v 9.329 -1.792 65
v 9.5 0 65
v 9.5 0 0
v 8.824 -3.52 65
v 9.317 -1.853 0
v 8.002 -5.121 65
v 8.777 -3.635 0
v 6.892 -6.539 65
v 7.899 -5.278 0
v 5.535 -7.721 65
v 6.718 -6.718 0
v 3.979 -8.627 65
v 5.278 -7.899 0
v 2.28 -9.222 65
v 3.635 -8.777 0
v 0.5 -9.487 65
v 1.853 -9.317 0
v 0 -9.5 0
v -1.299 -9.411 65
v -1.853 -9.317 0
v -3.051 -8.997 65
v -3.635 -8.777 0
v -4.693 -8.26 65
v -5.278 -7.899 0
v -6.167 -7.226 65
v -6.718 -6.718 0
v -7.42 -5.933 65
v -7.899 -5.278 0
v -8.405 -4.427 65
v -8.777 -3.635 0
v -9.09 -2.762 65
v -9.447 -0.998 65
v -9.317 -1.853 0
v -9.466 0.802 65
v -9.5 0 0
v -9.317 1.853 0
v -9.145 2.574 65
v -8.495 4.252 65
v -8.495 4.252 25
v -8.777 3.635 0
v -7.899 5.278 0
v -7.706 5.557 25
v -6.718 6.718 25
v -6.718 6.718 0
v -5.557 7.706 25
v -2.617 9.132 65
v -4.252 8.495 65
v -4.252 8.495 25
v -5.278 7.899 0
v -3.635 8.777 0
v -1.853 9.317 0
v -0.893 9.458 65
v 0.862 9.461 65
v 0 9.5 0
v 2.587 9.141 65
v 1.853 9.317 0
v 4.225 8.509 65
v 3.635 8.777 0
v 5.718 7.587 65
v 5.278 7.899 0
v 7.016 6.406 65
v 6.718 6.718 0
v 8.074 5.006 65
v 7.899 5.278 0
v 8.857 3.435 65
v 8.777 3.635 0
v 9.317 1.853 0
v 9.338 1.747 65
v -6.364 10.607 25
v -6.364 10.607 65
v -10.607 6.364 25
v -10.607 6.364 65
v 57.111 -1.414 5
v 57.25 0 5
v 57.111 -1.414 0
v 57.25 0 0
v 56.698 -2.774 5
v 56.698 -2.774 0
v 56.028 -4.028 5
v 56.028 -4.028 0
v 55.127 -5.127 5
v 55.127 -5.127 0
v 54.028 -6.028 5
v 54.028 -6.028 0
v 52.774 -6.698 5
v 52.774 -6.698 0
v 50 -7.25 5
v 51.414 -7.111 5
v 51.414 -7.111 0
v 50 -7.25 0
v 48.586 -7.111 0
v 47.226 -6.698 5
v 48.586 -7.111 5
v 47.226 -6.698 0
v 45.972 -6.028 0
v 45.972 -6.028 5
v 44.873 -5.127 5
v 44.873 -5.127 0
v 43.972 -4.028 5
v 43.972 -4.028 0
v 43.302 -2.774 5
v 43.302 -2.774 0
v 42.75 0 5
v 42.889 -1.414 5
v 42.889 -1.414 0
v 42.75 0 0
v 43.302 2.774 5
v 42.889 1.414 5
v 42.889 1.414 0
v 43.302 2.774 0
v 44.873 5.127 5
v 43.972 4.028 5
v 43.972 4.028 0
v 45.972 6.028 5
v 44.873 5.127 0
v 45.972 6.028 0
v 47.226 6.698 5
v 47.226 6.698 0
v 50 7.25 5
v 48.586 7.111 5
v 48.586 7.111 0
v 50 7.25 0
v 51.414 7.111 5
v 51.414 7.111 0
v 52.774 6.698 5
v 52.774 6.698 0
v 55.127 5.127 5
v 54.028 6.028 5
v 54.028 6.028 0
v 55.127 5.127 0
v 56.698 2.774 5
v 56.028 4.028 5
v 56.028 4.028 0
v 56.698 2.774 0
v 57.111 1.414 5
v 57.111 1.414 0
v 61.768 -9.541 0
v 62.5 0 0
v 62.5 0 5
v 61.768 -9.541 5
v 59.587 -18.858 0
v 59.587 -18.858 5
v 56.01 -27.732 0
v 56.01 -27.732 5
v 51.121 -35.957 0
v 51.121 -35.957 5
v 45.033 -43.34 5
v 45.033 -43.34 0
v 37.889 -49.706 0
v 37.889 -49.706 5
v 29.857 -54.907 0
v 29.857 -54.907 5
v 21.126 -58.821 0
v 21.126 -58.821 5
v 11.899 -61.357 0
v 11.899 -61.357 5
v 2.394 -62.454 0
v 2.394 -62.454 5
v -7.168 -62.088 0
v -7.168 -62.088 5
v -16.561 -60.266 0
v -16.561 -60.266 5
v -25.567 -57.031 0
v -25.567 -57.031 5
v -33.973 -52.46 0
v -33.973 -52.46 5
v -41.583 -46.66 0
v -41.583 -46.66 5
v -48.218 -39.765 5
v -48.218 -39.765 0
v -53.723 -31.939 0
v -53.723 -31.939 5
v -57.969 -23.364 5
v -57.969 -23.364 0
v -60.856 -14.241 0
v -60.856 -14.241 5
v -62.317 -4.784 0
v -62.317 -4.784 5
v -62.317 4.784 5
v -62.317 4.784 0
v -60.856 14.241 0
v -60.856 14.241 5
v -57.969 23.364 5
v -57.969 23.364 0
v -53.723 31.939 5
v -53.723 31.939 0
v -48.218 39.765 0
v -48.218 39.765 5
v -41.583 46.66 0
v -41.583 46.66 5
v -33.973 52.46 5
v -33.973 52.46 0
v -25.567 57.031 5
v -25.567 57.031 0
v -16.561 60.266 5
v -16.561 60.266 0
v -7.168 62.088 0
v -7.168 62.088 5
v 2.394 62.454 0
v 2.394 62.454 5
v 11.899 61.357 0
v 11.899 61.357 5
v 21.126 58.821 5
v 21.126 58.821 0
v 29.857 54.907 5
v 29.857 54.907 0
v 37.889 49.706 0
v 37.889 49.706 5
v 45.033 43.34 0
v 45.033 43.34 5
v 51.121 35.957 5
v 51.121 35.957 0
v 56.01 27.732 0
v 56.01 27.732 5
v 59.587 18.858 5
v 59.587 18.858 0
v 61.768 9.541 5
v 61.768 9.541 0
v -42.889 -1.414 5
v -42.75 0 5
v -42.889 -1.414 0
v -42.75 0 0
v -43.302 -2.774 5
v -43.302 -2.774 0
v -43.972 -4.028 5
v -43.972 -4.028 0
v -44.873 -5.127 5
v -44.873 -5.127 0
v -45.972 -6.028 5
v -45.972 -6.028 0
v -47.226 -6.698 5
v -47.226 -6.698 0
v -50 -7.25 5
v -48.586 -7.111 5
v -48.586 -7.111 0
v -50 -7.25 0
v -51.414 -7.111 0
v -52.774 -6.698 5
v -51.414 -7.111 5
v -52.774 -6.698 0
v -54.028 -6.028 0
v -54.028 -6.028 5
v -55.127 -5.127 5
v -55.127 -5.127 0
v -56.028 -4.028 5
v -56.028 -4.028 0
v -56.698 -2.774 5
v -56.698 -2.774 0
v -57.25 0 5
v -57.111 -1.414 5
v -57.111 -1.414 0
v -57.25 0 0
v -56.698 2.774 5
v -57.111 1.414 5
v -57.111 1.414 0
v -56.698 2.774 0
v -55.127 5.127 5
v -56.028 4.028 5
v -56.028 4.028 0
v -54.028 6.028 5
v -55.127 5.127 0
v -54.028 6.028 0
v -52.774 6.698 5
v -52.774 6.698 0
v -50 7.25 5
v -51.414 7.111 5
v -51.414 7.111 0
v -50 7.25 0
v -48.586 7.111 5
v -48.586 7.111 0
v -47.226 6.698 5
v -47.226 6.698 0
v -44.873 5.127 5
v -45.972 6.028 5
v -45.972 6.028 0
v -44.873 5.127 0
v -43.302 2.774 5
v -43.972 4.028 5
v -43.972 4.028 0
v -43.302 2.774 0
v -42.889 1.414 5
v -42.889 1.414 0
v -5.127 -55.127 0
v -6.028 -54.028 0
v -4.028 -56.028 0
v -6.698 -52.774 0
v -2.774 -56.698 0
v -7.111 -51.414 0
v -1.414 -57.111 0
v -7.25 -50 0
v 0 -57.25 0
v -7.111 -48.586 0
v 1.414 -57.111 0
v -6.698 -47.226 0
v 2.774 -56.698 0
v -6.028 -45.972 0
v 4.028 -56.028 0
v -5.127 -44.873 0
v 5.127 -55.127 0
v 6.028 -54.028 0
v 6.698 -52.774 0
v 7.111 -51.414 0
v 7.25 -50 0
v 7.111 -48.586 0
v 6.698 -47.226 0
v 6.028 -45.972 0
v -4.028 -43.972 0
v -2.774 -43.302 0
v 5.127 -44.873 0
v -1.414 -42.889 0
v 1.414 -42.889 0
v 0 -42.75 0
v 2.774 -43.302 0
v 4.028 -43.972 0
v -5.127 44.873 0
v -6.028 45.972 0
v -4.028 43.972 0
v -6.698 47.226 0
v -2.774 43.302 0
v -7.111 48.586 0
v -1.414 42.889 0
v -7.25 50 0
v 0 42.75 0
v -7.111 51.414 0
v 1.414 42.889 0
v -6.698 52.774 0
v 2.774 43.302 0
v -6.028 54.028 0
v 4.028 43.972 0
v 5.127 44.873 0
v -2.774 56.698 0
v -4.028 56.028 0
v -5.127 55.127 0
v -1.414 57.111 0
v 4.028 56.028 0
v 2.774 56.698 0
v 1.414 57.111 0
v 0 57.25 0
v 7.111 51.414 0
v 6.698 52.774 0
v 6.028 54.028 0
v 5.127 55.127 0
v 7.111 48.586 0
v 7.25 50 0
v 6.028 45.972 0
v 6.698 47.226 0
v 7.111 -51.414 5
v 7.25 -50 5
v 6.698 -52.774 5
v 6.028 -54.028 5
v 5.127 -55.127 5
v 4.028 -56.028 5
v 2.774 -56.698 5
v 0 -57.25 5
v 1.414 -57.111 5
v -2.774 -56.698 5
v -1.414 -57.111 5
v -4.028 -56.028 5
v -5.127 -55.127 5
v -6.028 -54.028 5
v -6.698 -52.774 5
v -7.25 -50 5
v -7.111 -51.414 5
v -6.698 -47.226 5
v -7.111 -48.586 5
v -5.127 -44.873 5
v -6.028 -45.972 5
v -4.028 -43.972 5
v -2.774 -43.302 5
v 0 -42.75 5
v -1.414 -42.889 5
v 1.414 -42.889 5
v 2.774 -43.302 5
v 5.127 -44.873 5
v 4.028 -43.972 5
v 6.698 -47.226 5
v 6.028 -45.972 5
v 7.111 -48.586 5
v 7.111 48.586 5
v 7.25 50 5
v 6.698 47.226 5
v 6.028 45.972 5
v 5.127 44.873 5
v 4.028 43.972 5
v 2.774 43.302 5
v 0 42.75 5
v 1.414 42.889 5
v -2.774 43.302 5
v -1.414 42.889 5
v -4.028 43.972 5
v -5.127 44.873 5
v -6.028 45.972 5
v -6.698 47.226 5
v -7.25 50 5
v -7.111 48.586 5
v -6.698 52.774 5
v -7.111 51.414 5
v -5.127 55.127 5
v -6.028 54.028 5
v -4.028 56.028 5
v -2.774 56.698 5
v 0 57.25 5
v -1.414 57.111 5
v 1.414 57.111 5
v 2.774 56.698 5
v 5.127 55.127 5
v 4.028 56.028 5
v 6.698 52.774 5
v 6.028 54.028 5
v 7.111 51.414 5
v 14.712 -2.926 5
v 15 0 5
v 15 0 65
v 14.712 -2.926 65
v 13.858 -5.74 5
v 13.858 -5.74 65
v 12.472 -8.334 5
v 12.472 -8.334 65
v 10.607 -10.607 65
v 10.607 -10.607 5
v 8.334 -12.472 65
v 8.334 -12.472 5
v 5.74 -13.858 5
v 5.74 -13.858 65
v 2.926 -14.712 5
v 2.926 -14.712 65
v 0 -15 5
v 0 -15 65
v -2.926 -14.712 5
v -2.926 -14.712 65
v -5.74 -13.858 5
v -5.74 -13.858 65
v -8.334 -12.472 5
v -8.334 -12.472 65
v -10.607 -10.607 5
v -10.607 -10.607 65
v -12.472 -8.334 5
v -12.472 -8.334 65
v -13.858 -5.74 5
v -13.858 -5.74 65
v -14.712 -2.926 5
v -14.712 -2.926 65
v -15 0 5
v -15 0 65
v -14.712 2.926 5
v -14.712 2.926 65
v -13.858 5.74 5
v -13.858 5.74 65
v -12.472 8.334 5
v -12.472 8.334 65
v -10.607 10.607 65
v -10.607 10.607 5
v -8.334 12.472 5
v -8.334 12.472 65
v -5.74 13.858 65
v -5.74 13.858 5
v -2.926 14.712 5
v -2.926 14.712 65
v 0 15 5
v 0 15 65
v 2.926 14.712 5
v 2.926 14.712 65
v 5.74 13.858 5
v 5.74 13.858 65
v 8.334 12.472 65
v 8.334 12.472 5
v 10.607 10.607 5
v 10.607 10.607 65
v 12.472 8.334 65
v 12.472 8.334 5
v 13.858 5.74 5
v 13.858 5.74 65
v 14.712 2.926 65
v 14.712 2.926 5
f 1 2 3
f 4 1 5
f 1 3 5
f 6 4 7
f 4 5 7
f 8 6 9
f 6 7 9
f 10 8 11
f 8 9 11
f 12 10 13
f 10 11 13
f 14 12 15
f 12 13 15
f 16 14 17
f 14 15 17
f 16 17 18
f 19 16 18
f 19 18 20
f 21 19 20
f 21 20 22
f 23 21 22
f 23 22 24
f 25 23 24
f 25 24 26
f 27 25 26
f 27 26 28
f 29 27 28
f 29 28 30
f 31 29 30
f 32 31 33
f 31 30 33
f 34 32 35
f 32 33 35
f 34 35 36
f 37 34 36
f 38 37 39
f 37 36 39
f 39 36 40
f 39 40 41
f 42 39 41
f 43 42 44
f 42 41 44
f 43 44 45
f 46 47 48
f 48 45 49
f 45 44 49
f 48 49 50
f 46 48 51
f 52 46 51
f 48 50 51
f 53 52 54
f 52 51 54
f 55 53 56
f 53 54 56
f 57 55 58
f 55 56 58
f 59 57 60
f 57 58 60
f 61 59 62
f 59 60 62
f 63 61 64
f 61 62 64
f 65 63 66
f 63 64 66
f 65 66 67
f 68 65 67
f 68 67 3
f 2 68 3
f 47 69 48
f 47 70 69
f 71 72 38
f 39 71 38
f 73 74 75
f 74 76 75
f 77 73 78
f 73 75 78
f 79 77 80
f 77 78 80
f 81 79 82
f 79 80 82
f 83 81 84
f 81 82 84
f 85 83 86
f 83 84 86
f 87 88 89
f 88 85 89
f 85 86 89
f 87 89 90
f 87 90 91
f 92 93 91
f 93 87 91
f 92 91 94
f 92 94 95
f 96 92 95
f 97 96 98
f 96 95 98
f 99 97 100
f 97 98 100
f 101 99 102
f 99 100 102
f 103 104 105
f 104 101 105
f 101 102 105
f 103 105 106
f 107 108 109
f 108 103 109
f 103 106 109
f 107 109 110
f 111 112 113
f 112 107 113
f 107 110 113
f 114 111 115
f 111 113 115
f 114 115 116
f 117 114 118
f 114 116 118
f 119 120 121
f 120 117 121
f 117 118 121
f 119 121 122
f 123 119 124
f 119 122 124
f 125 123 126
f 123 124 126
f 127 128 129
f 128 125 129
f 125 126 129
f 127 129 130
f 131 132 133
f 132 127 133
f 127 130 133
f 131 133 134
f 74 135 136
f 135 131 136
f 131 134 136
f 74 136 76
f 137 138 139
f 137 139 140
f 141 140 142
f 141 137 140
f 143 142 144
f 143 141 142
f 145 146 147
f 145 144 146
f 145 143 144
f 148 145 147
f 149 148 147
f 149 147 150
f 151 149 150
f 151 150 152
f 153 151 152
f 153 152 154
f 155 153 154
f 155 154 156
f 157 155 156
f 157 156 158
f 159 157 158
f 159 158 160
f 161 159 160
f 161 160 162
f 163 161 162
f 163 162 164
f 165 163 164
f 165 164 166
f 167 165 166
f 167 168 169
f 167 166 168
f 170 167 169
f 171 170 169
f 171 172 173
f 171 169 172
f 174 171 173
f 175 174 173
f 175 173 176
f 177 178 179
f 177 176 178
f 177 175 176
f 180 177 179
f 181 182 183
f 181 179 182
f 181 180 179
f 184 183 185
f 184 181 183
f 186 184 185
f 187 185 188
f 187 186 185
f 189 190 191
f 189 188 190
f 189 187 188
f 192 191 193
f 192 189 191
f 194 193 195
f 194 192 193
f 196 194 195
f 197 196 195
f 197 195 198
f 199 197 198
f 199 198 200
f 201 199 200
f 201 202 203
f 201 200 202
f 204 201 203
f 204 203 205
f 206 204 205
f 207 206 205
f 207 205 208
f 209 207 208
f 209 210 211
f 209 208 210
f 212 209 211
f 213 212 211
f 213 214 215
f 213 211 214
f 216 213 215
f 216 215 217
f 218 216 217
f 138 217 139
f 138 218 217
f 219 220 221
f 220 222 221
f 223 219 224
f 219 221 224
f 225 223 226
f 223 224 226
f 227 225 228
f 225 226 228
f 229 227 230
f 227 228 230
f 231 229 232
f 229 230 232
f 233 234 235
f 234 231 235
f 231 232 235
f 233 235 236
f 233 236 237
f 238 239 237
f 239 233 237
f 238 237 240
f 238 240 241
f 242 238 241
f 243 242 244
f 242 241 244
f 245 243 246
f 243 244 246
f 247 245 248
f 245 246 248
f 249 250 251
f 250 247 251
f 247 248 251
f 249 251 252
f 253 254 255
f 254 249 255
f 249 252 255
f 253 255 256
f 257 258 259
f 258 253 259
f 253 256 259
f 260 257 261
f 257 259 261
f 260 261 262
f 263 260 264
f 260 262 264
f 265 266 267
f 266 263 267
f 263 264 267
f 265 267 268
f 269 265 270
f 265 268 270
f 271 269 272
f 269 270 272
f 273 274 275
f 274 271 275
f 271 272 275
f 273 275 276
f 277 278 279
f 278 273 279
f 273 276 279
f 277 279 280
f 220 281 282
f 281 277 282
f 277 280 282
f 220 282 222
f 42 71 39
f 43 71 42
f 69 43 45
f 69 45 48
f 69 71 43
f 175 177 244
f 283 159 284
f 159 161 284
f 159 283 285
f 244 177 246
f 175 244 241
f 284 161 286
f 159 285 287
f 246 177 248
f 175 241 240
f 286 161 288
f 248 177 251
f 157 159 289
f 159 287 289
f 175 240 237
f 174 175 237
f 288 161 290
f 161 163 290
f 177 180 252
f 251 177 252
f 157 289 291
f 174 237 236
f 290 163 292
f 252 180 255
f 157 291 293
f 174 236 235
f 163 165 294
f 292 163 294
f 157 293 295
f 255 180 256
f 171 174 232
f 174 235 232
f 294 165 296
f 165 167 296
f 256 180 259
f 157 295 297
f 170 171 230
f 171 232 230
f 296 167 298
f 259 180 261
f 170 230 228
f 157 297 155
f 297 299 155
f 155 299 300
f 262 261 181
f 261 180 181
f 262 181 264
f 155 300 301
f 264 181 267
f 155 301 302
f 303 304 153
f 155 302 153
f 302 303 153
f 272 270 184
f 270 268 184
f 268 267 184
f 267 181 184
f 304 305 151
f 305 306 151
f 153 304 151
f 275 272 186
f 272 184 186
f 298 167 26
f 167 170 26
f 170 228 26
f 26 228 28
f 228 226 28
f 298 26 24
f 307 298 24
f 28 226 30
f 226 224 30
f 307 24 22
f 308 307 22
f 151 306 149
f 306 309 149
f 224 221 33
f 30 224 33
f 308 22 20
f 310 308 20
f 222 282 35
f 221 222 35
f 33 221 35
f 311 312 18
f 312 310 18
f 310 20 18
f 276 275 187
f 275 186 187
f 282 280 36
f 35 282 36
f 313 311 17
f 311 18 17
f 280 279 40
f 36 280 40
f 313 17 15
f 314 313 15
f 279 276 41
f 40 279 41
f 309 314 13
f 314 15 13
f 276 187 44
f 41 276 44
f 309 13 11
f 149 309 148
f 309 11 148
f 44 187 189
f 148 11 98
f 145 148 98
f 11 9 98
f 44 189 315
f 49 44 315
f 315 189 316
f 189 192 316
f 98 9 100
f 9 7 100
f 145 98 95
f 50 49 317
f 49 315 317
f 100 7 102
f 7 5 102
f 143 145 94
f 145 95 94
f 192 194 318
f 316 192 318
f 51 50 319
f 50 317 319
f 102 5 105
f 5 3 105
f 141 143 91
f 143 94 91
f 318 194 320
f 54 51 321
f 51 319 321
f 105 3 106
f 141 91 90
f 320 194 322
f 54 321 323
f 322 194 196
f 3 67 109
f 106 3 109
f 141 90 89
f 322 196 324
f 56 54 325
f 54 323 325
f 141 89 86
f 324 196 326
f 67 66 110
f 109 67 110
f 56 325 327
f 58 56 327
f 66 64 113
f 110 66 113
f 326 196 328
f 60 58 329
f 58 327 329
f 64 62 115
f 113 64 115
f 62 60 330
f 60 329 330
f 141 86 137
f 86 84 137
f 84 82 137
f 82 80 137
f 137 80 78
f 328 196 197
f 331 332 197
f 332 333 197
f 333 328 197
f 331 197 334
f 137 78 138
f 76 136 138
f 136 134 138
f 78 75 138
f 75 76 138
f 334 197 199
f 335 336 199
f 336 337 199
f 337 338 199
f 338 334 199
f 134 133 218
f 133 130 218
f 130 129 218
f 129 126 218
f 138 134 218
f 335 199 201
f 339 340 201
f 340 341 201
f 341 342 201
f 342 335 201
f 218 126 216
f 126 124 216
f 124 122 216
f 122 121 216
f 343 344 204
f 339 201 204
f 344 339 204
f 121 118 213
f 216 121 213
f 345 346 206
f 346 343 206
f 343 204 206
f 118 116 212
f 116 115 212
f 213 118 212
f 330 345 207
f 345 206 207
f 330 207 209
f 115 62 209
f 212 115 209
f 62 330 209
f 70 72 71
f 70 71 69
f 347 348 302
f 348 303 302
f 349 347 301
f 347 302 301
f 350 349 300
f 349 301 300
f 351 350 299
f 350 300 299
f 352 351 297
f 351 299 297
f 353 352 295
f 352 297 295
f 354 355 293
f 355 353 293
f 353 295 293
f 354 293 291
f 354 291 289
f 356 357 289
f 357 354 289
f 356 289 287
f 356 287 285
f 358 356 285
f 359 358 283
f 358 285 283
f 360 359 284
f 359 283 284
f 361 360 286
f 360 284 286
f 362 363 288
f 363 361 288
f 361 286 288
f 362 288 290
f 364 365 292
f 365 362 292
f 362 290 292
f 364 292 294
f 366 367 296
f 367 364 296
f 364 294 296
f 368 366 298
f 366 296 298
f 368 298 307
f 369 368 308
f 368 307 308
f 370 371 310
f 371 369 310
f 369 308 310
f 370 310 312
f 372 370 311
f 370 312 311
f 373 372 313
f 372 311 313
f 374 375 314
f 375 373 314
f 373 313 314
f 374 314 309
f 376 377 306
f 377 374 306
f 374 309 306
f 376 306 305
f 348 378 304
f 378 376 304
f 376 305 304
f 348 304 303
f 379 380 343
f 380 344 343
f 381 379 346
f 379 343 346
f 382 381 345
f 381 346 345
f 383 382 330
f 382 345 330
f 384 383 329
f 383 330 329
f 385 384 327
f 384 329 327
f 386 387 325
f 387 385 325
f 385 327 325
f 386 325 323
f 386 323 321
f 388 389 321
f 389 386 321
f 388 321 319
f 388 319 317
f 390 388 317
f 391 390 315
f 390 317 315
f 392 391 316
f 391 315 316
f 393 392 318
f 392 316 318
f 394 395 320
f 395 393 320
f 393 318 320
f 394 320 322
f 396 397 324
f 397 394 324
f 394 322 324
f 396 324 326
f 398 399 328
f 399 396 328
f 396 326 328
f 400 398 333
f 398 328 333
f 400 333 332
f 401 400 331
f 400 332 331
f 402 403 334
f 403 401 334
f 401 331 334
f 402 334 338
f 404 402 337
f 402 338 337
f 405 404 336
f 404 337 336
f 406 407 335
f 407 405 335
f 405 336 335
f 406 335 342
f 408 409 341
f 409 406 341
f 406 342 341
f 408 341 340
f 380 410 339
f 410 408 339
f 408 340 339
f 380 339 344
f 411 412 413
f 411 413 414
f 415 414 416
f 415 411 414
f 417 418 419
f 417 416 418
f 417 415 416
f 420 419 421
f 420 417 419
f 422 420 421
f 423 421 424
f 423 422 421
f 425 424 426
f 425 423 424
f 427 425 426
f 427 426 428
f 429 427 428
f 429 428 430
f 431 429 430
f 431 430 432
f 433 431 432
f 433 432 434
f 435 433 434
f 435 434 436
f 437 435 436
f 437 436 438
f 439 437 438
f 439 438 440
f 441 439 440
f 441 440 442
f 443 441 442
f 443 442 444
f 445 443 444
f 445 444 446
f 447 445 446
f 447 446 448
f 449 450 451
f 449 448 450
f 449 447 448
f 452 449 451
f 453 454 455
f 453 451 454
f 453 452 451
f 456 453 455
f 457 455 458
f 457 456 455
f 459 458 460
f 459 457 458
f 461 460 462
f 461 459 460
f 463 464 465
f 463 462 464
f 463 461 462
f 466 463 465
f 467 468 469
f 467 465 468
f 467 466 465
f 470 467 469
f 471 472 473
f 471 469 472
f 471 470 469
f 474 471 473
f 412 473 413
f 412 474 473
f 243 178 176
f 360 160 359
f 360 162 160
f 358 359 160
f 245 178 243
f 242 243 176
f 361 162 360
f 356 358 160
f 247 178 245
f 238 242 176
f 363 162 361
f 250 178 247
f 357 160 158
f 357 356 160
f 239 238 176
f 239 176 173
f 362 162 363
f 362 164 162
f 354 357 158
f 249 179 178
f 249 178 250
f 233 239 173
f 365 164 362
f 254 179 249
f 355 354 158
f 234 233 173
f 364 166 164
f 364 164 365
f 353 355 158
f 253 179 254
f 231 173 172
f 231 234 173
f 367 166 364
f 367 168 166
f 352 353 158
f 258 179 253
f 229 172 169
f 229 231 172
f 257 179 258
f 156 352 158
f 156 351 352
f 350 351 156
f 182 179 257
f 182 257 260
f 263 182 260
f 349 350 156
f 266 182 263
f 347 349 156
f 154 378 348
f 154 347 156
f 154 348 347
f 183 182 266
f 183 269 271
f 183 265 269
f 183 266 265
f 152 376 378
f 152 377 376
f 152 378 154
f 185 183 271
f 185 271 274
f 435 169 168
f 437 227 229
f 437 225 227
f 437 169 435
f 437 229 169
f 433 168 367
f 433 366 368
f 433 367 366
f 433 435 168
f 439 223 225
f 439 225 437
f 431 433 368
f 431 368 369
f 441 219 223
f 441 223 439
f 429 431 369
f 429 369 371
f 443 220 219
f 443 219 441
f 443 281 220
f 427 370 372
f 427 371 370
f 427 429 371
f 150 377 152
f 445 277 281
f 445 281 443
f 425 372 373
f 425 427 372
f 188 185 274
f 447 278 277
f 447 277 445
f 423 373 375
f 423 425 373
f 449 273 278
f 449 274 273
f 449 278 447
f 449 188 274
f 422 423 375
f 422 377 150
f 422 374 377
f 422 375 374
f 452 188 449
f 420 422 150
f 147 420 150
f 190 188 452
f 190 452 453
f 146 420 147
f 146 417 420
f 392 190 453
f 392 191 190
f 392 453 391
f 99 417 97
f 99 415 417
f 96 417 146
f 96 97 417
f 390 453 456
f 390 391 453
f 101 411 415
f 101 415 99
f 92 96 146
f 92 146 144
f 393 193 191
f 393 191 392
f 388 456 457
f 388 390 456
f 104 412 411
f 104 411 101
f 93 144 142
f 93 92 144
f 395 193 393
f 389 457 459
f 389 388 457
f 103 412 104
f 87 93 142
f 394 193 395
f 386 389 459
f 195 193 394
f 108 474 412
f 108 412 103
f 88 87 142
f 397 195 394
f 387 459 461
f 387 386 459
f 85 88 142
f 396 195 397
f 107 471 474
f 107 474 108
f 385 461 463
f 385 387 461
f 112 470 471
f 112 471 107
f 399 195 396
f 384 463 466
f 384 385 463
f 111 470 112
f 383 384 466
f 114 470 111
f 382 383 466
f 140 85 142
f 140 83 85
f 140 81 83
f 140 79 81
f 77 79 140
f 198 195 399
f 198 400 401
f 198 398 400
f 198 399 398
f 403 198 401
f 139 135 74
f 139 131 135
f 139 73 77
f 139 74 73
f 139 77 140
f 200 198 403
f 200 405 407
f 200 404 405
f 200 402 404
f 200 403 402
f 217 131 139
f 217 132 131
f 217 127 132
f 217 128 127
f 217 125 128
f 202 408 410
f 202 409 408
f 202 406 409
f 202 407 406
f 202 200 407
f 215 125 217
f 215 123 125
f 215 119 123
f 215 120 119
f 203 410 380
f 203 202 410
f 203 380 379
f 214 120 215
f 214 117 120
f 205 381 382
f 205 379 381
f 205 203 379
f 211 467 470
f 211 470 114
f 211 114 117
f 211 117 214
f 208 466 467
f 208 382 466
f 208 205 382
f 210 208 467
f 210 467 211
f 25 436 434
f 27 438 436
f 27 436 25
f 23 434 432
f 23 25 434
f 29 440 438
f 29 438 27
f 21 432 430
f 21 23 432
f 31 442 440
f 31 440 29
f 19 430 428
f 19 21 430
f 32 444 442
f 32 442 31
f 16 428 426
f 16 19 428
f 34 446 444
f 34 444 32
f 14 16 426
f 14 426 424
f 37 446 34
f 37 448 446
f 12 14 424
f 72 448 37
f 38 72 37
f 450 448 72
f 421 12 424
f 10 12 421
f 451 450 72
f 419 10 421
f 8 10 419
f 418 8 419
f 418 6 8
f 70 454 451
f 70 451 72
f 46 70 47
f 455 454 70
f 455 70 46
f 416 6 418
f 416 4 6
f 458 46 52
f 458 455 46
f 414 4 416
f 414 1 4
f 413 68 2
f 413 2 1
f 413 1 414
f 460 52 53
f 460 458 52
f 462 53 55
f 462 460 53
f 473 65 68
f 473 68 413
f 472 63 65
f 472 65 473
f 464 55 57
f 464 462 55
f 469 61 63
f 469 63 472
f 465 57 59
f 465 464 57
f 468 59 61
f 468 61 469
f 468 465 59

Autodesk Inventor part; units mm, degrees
ref_plane "YZ Plane" through (0, 0, 0) normal (1, 0, 0) x (0, 1, 0)
ref_plane "XZ Plane" through (0, 0, 0) normal (0, 1, 0) x (-1, 0, 0)
ref_plane "XY Plane" through (0, 0, 0) normal (0, 0, 1) x (1, 0, 0)
sketch "Sketch1" plane through (0, 0, 0) normal (0, 0, 1) x (1, 0, 0)
  circle A0 centre (0, 0) radius 50 construction
  circle A1 centre (0, 50) radius 7.25
  circle A2 centre (-50, 0) radius 7.25
  circle A3 centre (0, -50) radius 7.25
  circle A4 centre (50, 0) radius 7.25
  circle A5 centre (0, 0) radius 15 construction
  circle A6 centre (0, 0) radius 62.5
  circle A7 centre (0, 0) radius 9.5
  dimension "d0" = 100
  dimension "d1" = 14.5
  dimension "d4" = 360
  dimension "d6" = 30
  dimension "d7" = 125
  dimension "d8" = 19
extrude "Extrusion1" add sketch "Sketch1" along normal blind 5
sketch "Sketch2" plane through (0, 0, 5) normal (0, 0, 1) x (1, 0, 0)
  circle A0 centre (0, 0) radius 15
  circle A1 centre (0, 0) radius 9.5 projected
  dimension "d11" = 30
extrude "Extrusion2" add sketch "Sketch2" along normal blind 60
sketch "Sketch3" plane through (0, 0, 65) normal (0, 0, 1) x (1, 0, 0)
  circle A0 centre (0, 0) radius 15 projected
  circle A1 centre (0, 0) radius 9.5 projected
  line L0 (6.7175, -6.7175) -> (-8.4853, 8.4853)
  line L1 (-8.4853, 8.4853) -> (-10.6066, 6.364)
  line L2 (-10.6066, 6.364) -> (-8.4951, 4.2525)
  line L3 (-8.4853, 8.4853) -> (-6.364, 10.6066)
  line L4 (-6.364, 10.6066) -> (-4.2525, 8.4951)
  dimension "d14" = 21.5
  dimension "d15" = 3
  dimension "d16" = 3
extrude "Extrusion3" cut sketch "Sketch3" against normal blind 40 contours A1 L0 L3 L4 | A1 L2 L1 L0
properties part number "wheelFlangeMotor"
